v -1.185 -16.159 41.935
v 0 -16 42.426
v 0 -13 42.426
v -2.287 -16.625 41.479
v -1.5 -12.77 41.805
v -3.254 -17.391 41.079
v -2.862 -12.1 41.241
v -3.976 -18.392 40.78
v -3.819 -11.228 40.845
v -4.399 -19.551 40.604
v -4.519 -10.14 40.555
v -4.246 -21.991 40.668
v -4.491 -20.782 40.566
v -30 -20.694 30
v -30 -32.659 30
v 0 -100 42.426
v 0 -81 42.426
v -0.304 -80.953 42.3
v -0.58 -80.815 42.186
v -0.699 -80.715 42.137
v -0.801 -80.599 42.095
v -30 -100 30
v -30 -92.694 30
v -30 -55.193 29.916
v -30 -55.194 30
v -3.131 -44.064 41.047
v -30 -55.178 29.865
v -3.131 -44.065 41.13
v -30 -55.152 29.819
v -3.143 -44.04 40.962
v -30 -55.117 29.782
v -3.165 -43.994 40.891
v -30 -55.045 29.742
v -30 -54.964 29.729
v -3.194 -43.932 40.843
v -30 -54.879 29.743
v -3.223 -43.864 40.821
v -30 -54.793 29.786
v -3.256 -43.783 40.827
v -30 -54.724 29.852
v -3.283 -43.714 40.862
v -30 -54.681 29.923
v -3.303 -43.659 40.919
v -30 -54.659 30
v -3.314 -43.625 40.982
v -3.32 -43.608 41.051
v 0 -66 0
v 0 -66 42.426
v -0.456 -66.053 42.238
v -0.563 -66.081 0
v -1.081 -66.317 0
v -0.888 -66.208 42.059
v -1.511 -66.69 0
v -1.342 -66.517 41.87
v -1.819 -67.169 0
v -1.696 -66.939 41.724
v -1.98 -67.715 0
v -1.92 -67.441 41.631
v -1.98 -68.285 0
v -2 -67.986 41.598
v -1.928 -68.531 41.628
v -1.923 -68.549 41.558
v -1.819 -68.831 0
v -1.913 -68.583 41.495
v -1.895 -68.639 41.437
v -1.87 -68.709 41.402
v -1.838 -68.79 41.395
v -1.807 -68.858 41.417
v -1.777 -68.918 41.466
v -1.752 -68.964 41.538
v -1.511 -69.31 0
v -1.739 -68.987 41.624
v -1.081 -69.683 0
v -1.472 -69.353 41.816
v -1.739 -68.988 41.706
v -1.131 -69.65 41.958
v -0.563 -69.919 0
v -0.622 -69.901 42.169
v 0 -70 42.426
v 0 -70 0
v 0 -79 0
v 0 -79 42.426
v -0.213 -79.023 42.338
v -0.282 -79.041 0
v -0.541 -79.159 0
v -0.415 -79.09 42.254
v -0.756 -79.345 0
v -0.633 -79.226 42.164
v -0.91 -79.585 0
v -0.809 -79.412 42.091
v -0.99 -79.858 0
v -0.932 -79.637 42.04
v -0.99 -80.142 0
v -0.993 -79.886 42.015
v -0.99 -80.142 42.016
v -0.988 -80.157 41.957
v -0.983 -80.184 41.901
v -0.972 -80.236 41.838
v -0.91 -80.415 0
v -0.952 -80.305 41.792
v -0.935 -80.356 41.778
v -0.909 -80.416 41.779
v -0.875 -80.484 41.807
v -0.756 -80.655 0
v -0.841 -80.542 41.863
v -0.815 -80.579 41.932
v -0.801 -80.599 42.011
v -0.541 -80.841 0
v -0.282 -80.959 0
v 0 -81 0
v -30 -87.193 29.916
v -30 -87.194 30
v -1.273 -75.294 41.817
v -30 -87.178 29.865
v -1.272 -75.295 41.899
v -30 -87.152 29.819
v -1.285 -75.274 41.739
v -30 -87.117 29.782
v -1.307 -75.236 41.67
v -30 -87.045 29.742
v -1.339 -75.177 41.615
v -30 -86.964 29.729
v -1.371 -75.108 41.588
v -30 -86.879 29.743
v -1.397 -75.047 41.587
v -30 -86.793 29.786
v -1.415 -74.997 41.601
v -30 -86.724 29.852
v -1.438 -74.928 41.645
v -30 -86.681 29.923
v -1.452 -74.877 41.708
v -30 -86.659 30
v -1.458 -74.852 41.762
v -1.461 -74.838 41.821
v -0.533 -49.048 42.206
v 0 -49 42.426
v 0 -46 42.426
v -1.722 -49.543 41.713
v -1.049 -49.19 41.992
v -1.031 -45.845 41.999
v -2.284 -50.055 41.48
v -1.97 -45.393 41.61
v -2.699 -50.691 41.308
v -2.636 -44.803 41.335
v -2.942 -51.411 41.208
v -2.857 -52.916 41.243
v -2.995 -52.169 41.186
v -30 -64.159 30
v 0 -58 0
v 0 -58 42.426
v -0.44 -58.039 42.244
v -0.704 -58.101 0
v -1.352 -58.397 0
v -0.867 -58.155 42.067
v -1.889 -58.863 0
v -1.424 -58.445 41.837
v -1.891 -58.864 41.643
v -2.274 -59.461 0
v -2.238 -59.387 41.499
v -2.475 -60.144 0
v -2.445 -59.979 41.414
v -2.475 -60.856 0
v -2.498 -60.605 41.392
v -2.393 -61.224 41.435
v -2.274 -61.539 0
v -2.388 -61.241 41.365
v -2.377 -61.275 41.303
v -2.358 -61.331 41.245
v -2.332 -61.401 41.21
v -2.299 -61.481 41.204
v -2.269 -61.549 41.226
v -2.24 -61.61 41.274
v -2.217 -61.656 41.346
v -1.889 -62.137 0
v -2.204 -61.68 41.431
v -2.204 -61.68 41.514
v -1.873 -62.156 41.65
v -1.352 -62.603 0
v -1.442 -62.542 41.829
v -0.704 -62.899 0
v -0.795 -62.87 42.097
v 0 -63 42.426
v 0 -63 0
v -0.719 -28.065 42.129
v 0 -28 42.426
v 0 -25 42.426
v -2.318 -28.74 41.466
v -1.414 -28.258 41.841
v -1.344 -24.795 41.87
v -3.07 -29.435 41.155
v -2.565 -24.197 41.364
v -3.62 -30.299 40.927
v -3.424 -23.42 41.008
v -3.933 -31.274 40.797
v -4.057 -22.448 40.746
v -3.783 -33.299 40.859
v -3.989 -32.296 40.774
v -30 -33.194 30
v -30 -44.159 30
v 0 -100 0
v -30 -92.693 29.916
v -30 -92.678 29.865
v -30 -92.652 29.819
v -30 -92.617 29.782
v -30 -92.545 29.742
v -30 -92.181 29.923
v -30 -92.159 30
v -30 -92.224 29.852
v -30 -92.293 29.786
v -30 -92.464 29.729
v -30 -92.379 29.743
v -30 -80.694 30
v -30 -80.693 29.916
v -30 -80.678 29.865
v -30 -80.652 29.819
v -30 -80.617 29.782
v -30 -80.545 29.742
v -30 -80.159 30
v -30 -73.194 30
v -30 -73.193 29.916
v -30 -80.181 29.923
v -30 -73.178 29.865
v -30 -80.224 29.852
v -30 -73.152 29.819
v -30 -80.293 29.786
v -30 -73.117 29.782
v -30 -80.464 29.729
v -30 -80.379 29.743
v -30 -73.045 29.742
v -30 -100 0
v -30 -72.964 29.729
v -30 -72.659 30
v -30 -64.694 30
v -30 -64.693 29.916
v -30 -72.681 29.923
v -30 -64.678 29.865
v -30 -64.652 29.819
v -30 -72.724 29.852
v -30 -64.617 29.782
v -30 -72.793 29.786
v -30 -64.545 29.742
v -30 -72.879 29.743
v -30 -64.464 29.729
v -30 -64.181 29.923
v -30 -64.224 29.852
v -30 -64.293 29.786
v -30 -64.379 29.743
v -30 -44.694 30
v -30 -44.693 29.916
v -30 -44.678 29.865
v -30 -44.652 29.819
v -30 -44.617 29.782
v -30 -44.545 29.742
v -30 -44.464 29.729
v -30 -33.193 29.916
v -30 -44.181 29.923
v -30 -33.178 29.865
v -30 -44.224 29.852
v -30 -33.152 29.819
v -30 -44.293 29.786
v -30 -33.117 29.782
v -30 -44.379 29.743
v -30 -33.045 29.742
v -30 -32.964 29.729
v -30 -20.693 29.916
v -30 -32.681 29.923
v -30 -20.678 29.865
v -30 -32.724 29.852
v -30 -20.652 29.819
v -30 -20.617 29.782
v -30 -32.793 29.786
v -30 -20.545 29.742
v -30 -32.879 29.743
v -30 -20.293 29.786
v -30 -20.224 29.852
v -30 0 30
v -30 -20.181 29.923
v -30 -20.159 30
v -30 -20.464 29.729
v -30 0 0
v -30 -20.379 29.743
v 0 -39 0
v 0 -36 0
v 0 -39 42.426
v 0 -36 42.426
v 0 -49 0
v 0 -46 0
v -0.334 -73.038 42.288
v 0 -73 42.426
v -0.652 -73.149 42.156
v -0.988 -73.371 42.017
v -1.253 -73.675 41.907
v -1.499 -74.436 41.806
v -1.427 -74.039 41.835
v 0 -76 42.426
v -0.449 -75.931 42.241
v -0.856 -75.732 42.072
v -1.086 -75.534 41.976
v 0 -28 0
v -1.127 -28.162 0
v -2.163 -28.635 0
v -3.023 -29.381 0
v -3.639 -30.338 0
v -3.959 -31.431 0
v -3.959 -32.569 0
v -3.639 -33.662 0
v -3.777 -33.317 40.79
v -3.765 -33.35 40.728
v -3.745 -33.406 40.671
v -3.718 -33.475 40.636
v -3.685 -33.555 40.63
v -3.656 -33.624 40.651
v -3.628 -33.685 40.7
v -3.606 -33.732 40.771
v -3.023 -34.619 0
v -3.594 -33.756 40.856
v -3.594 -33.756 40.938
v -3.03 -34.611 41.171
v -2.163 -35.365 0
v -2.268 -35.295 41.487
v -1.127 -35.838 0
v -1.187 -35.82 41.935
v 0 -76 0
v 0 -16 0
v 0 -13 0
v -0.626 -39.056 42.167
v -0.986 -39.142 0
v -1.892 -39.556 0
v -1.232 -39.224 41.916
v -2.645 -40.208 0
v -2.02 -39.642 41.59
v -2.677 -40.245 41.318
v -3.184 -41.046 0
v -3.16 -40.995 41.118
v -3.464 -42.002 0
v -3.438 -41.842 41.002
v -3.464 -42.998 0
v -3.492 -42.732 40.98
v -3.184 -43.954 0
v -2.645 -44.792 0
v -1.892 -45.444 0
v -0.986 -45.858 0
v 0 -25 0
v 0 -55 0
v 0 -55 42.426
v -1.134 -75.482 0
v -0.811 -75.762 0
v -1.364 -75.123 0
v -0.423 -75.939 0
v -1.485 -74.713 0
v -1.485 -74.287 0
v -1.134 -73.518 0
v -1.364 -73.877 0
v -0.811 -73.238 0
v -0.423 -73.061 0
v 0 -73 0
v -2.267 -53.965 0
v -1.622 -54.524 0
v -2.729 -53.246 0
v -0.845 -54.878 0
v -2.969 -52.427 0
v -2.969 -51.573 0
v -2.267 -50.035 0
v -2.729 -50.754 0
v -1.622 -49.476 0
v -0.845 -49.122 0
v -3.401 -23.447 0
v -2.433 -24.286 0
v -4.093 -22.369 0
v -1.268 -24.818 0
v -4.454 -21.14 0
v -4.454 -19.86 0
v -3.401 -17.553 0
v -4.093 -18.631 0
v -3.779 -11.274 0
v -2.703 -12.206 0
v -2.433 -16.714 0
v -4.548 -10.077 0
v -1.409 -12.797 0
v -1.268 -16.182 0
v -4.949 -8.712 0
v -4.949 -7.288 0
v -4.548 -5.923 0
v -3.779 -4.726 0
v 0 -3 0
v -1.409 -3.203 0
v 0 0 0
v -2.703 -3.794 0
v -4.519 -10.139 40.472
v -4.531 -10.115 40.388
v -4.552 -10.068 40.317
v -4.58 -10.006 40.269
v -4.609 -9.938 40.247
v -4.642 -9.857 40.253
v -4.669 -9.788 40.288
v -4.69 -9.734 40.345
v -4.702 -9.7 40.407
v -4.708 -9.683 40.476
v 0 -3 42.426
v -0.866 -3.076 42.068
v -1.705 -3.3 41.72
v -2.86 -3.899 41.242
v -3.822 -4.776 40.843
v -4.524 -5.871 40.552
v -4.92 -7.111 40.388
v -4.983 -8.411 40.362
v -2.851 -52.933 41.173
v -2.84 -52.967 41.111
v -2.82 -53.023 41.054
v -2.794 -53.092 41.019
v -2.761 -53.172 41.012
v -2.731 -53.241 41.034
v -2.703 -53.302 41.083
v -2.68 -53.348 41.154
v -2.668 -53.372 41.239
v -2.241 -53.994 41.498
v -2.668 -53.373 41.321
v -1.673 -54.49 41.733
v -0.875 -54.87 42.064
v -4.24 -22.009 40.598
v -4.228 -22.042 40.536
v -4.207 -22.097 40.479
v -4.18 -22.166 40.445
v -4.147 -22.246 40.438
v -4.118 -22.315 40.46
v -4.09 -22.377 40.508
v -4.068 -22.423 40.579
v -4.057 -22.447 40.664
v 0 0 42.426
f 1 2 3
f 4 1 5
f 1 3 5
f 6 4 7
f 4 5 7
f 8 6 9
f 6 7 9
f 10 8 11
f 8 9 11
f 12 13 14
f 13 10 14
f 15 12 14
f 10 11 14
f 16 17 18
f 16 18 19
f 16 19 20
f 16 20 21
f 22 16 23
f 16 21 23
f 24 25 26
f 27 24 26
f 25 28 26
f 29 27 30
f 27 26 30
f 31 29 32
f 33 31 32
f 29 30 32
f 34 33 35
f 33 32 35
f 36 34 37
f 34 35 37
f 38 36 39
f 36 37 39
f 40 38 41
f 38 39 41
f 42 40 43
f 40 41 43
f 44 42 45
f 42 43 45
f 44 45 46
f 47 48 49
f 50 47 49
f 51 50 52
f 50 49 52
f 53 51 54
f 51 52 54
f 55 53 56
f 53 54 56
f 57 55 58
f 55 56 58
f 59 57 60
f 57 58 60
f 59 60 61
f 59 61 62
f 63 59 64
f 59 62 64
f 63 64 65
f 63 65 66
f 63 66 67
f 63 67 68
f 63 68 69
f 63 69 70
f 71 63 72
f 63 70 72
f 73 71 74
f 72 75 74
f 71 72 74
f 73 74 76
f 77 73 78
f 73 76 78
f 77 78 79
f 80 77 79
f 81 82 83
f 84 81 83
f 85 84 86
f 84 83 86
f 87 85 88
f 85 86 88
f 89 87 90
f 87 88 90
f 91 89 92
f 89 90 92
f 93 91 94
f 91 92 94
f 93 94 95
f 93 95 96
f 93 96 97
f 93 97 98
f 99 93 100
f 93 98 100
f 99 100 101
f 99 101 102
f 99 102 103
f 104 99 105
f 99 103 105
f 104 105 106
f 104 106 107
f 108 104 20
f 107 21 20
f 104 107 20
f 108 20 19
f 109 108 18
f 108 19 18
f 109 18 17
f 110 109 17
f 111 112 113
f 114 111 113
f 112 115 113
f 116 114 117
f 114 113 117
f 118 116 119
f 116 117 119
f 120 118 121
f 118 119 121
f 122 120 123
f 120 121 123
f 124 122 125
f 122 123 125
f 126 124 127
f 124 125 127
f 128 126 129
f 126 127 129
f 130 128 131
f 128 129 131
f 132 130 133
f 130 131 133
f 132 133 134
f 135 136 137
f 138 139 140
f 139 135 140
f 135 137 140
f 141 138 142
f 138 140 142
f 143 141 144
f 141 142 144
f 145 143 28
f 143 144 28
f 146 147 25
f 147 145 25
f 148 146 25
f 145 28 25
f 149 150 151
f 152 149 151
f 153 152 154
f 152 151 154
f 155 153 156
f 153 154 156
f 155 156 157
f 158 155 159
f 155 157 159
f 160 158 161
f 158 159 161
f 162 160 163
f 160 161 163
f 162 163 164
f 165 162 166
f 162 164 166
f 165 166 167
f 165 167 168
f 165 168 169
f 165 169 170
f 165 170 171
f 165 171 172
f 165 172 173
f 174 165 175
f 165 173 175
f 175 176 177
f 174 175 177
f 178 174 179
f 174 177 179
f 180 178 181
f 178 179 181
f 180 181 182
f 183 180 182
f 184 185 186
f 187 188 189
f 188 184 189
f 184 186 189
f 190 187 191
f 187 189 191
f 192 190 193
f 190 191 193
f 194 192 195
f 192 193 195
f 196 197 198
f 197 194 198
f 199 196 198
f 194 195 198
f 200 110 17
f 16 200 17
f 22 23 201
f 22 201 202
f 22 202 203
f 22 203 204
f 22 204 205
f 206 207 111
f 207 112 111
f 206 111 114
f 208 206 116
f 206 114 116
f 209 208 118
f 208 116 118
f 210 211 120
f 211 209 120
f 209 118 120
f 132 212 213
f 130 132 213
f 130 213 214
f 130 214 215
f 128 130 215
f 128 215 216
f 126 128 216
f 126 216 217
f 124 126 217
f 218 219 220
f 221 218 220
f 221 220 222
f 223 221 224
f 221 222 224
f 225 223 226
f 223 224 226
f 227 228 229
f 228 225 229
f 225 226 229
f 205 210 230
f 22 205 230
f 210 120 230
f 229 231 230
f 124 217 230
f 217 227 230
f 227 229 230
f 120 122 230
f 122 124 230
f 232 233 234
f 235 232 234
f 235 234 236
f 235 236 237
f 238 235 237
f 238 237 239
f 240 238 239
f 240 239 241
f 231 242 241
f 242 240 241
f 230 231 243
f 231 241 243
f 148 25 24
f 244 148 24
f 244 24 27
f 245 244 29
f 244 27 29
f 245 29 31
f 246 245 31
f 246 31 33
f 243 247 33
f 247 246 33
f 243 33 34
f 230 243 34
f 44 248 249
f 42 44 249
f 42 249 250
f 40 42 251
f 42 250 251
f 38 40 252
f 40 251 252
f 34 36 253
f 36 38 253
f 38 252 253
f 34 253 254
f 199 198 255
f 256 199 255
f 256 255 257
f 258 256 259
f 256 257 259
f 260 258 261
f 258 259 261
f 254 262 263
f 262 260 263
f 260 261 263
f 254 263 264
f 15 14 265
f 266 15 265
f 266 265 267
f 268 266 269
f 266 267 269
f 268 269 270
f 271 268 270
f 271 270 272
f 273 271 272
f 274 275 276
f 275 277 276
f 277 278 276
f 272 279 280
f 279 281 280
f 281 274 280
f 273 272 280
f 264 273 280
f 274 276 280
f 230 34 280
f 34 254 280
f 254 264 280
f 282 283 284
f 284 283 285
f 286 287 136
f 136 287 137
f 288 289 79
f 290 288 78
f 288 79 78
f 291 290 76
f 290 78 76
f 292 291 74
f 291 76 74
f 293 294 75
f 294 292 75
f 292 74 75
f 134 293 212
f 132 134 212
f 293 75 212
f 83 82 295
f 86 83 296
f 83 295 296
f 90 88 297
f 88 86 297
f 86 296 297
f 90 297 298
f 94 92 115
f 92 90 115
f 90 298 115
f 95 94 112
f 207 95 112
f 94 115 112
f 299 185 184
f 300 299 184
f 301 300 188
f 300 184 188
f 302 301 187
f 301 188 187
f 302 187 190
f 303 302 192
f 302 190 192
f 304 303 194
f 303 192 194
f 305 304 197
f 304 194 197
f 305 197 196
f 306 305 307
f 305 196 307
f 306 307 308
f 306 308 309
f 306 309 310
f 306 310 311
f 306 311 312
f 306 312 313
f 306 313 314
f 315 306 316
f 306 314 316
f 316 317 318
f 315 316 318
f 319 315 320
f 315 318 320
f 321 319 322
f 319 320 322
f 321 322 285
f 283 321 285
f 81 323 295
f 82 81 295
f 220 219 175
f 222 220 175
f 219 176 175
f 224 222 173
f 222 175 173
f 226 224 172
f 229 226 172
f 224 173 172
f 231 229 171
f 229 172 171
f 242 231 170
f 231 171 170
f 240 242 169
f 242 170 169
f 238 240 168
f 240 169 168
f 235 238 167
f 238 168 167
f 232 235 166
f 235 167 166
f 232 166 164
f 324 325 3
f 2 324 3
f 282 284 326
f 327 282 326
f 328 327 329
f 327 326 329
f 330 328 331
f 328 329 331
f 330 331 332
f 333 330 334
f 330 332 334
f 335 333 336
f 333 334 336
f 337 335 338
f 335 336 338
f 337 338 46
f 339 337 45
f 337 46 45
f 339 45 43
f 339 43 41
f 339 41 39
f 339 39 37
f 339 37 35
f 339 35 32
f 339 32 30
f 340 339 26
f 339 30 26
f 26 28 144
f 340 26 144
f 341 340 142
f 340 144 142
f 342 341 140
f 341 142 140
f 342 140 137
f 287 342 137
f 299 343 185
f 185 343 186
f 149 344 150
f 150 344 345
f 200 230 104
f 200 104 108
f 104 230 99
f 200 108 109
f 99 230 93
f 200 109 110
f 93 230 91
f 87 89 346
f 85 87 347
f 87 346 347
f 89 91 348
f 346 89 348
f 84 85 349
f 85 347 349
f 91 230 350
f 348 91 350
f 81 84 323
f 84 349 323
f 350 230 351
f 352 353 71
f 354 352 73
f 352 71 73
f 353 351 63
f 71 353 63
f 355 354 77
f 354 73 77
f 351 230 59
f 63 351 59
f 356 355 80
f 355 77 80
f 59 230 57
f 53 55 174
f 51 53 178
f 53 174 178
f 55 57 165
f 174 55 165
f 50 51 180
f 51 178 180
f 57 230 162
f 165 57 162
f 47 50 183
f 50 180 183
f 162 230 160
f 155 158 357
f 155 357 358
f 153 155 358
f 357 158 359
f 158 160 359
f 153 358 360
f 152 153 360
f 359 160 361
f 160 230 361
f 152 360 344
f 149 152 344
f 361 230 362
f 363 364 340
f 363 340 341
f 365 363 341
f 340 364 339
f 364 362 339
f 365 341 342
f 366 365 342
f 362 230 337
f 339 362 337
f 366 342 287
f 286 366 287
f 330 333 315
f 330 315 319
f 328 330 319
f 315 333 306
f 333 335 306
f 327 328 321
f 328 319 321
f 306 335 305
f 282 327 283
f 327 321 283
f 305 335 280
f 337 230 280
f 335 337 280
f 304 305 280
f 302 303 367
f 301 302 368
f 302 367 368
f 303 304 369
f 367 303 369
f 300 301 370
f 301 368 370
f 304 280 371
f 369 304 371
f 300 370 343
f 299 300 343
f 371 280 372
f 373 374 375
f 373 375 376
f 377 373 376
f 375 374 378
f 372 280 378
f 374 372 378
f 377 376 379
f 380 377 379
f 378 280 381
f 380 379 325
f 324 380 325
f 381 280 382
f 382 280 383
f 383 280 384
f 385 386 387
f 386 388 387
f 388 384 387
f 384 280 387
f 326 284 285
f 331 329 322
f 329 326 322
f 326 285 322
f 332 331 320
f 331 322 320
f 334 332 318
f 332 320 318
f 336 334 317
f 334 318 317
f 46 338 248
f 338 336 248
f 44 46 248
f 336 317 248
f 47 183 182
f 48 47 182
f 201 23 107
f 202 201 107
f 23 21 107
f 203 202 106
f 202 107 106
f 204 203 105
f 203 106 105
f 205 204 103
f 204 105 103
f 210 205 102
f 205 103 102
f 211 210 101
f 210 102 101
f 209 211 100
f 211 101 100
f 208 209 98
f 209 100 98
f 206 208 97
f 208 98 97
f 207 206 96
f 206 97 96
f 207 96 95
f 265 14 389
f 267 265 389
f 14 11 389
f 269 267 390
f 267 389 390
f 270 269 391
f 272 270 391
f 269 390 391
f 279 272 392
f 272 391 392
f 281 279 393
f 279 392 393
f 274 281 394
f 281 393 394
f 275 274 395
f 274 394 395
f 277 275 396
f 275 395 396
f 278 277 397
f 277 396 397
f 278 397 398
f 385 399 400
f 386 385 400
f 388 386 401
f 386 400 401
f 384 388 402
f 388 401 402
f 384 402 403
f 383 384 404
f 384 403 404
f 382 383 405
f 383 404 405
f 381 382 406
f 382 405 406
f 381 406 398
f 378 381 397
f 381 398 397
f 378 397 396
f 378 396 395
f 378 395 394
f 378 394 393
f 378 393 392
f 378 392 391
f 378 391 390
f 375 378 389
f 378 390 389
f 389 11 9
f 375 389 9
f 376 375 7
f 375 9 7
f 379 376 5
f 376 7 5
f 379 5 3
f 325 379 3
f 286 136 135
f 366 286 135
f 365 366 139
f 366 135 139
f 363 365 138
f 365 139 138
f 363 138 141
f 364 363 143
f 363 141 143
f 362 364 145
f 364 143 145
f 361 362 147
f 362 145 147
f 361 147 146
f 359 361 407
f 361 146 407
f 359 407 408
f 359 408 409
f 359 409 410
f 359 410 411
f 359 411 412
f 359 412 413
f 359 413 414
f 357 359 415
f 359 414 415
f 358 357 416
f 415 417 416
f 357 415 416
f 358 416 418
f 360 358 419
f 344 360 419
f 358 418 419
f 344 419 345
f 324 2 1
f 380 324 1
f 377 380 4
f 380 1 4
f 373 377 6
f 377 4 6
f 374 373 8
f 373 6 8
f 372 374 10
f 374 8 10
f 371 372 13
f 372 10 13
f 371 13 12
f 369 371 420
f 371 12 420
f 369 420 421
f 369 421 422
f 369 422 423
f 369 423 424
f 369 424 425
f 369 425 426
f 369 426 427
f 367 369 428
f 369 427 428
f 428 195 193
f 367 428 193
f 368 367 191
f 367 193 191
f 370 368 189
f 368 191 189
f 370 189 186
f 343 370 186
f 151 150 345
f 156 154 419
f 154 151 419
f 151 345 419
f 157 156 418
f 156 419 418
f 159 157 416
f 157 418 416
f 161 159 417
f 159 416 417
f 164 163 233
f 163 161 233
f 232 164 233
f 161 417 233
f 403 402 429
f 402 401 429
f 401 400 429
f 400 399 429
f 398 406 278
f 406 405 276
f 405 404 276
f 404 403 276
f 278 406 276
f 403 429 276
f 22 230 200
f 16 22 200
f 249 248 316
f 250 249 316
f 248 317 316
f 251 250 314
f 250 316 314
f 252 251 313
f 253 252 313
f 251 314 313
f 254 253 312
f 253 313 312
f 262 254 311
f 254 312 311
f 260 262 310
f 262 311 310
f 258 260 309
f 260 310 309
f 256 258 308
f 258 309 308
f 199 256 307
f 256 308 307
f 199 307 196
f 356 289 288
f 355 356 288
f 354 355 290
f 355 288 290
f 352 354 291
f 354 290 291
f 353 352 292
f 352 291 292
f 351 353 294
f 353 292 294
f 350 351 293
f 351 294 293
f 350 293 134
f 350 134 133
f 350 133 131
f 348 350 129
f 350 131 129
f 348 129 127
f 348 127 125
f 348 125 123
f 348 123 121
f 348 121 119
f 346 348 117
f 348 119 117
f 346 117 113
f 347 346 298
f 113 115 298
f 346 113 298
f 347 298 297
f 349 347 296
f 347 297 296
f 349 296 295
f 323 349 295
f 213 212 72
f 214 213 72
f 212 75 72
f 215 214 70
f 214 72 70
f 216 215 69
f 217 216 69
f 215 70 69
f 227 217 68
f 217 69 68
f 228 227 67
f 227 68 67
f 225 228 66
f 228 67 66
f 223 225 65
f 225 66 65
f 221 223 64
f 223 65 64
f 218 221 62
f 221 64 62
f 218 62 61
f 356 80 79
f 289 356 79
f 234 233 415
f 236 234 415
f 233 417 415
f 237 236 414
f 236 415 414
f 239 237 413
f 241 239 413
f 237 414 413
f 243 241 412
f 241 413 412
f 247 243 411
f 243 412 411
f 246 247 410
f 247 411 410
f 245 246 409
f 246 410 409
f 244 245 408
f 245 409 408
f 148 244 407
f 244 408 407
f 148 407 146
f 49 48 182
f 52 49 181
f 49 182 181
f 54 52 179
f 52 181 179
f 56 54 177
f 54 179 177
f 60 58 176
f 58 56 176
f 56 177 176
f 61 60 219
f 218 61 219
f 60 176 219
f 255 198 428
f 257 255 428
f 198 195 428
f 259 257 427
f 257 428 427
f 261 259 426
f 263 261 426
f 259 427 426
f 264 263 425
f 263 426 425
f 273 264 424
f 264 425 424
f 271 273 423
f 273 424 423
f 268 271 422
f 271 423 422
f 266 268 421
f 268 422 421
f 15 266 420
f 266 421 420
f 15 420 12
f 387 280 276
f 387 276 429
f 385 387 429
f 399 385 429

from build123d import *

# Parameters (mm, degrees)
F1_DEPTH  = 100
F8_R      = 0.25
F9_DEPTH  = 76.7908446712
F3_R      = 5
F3_R_2    = 4.5
F3_R_3    = 4
F3_R_4    = 3.5
F3_R_5    = 3
F3_R_6    = 2.5
F3_R_7    = 2
F3_R_8    = 1.5
F3_R_9    = 1
F10_DEPTH = 42.4274068712


with BuildPart() as f1:
    # F0 (on Front) → F1 (new body)
    with BuildSketch(Plane.XZ):
        Polygon((0, 0), (0, 42.4264068712), (-30, 30), (-30, 0), align=None)
    extrude(amount=F1_DEPTH)

    # F8 (on line) → F9 (cut, through all)
    with BuildSketch(Plane(origin=(13.0839062865, 5.4195314327, 5.4195314327), x_dir=(-0.3302007759, 0.9339488311, -0.1367736397), z_dir=(0.8628562095, 0.3574067443, 0.3574067443))):
        with Locations((-13.2744047348, 39.1968889463)):
            Circle(F8_R)
        with Locations((-24.9487651235, 39.1968889463)):
            Circle(F8_R)
        with Locations((-35.6891766811, 39.1968889463)):
            Circle(F8_R)
        with Locations((-45.4956394075, 39.1968889463)):
            Circle(F8_R)
        with Locations((-54.3681533029, 39.1968889463)):
            Circle(F8_R)
        with Locations((-62.3067183672, 39.1968889463)):
            Circle(F8_R)
        with Locations((-69.3113346005, 39.1968889463)):
            Circle(F8_R)
        with Locations((-75.3820020026, 39.1968889463)):
            Circle(F8_R)
        with Locations((-80.5187205736, 39.1968889463)):
            Circle(F8_R)
    extrude(amount=-F9_DEPTH, mode=Mode.SUBTRACT)

    # F3 (on plane+point) → F10 (cut, through all)
    with BuildSketch(Plane.XY.offset(42.4264068712)):
        with Locations((0, -8)):
            Circle(F3_R)
        with Locations((0, -20.5)):
            Circle(F3_R_2)
        with Locations((0, -32)):
            Circle(F3_R_3)
        with Locations((0, -42.5)):
            Circle(F3_R_4)
        with Locations((0, -52)):
            Circle(F3_R_5)
        with Locations((0, -60.5)):
            Circle(F3_R_6)
        with Locations((0, -68)):
            Circle(F3_R_7)
        with Locations((0, -74.5)):
            Circle(F3_R_8)
        with Locations((0, -80)):
            Circle(F3_R_9)
    extrude(amount=-F10_DEPTH, mode=Mode.SUBTRACT)


solid = f1.part
